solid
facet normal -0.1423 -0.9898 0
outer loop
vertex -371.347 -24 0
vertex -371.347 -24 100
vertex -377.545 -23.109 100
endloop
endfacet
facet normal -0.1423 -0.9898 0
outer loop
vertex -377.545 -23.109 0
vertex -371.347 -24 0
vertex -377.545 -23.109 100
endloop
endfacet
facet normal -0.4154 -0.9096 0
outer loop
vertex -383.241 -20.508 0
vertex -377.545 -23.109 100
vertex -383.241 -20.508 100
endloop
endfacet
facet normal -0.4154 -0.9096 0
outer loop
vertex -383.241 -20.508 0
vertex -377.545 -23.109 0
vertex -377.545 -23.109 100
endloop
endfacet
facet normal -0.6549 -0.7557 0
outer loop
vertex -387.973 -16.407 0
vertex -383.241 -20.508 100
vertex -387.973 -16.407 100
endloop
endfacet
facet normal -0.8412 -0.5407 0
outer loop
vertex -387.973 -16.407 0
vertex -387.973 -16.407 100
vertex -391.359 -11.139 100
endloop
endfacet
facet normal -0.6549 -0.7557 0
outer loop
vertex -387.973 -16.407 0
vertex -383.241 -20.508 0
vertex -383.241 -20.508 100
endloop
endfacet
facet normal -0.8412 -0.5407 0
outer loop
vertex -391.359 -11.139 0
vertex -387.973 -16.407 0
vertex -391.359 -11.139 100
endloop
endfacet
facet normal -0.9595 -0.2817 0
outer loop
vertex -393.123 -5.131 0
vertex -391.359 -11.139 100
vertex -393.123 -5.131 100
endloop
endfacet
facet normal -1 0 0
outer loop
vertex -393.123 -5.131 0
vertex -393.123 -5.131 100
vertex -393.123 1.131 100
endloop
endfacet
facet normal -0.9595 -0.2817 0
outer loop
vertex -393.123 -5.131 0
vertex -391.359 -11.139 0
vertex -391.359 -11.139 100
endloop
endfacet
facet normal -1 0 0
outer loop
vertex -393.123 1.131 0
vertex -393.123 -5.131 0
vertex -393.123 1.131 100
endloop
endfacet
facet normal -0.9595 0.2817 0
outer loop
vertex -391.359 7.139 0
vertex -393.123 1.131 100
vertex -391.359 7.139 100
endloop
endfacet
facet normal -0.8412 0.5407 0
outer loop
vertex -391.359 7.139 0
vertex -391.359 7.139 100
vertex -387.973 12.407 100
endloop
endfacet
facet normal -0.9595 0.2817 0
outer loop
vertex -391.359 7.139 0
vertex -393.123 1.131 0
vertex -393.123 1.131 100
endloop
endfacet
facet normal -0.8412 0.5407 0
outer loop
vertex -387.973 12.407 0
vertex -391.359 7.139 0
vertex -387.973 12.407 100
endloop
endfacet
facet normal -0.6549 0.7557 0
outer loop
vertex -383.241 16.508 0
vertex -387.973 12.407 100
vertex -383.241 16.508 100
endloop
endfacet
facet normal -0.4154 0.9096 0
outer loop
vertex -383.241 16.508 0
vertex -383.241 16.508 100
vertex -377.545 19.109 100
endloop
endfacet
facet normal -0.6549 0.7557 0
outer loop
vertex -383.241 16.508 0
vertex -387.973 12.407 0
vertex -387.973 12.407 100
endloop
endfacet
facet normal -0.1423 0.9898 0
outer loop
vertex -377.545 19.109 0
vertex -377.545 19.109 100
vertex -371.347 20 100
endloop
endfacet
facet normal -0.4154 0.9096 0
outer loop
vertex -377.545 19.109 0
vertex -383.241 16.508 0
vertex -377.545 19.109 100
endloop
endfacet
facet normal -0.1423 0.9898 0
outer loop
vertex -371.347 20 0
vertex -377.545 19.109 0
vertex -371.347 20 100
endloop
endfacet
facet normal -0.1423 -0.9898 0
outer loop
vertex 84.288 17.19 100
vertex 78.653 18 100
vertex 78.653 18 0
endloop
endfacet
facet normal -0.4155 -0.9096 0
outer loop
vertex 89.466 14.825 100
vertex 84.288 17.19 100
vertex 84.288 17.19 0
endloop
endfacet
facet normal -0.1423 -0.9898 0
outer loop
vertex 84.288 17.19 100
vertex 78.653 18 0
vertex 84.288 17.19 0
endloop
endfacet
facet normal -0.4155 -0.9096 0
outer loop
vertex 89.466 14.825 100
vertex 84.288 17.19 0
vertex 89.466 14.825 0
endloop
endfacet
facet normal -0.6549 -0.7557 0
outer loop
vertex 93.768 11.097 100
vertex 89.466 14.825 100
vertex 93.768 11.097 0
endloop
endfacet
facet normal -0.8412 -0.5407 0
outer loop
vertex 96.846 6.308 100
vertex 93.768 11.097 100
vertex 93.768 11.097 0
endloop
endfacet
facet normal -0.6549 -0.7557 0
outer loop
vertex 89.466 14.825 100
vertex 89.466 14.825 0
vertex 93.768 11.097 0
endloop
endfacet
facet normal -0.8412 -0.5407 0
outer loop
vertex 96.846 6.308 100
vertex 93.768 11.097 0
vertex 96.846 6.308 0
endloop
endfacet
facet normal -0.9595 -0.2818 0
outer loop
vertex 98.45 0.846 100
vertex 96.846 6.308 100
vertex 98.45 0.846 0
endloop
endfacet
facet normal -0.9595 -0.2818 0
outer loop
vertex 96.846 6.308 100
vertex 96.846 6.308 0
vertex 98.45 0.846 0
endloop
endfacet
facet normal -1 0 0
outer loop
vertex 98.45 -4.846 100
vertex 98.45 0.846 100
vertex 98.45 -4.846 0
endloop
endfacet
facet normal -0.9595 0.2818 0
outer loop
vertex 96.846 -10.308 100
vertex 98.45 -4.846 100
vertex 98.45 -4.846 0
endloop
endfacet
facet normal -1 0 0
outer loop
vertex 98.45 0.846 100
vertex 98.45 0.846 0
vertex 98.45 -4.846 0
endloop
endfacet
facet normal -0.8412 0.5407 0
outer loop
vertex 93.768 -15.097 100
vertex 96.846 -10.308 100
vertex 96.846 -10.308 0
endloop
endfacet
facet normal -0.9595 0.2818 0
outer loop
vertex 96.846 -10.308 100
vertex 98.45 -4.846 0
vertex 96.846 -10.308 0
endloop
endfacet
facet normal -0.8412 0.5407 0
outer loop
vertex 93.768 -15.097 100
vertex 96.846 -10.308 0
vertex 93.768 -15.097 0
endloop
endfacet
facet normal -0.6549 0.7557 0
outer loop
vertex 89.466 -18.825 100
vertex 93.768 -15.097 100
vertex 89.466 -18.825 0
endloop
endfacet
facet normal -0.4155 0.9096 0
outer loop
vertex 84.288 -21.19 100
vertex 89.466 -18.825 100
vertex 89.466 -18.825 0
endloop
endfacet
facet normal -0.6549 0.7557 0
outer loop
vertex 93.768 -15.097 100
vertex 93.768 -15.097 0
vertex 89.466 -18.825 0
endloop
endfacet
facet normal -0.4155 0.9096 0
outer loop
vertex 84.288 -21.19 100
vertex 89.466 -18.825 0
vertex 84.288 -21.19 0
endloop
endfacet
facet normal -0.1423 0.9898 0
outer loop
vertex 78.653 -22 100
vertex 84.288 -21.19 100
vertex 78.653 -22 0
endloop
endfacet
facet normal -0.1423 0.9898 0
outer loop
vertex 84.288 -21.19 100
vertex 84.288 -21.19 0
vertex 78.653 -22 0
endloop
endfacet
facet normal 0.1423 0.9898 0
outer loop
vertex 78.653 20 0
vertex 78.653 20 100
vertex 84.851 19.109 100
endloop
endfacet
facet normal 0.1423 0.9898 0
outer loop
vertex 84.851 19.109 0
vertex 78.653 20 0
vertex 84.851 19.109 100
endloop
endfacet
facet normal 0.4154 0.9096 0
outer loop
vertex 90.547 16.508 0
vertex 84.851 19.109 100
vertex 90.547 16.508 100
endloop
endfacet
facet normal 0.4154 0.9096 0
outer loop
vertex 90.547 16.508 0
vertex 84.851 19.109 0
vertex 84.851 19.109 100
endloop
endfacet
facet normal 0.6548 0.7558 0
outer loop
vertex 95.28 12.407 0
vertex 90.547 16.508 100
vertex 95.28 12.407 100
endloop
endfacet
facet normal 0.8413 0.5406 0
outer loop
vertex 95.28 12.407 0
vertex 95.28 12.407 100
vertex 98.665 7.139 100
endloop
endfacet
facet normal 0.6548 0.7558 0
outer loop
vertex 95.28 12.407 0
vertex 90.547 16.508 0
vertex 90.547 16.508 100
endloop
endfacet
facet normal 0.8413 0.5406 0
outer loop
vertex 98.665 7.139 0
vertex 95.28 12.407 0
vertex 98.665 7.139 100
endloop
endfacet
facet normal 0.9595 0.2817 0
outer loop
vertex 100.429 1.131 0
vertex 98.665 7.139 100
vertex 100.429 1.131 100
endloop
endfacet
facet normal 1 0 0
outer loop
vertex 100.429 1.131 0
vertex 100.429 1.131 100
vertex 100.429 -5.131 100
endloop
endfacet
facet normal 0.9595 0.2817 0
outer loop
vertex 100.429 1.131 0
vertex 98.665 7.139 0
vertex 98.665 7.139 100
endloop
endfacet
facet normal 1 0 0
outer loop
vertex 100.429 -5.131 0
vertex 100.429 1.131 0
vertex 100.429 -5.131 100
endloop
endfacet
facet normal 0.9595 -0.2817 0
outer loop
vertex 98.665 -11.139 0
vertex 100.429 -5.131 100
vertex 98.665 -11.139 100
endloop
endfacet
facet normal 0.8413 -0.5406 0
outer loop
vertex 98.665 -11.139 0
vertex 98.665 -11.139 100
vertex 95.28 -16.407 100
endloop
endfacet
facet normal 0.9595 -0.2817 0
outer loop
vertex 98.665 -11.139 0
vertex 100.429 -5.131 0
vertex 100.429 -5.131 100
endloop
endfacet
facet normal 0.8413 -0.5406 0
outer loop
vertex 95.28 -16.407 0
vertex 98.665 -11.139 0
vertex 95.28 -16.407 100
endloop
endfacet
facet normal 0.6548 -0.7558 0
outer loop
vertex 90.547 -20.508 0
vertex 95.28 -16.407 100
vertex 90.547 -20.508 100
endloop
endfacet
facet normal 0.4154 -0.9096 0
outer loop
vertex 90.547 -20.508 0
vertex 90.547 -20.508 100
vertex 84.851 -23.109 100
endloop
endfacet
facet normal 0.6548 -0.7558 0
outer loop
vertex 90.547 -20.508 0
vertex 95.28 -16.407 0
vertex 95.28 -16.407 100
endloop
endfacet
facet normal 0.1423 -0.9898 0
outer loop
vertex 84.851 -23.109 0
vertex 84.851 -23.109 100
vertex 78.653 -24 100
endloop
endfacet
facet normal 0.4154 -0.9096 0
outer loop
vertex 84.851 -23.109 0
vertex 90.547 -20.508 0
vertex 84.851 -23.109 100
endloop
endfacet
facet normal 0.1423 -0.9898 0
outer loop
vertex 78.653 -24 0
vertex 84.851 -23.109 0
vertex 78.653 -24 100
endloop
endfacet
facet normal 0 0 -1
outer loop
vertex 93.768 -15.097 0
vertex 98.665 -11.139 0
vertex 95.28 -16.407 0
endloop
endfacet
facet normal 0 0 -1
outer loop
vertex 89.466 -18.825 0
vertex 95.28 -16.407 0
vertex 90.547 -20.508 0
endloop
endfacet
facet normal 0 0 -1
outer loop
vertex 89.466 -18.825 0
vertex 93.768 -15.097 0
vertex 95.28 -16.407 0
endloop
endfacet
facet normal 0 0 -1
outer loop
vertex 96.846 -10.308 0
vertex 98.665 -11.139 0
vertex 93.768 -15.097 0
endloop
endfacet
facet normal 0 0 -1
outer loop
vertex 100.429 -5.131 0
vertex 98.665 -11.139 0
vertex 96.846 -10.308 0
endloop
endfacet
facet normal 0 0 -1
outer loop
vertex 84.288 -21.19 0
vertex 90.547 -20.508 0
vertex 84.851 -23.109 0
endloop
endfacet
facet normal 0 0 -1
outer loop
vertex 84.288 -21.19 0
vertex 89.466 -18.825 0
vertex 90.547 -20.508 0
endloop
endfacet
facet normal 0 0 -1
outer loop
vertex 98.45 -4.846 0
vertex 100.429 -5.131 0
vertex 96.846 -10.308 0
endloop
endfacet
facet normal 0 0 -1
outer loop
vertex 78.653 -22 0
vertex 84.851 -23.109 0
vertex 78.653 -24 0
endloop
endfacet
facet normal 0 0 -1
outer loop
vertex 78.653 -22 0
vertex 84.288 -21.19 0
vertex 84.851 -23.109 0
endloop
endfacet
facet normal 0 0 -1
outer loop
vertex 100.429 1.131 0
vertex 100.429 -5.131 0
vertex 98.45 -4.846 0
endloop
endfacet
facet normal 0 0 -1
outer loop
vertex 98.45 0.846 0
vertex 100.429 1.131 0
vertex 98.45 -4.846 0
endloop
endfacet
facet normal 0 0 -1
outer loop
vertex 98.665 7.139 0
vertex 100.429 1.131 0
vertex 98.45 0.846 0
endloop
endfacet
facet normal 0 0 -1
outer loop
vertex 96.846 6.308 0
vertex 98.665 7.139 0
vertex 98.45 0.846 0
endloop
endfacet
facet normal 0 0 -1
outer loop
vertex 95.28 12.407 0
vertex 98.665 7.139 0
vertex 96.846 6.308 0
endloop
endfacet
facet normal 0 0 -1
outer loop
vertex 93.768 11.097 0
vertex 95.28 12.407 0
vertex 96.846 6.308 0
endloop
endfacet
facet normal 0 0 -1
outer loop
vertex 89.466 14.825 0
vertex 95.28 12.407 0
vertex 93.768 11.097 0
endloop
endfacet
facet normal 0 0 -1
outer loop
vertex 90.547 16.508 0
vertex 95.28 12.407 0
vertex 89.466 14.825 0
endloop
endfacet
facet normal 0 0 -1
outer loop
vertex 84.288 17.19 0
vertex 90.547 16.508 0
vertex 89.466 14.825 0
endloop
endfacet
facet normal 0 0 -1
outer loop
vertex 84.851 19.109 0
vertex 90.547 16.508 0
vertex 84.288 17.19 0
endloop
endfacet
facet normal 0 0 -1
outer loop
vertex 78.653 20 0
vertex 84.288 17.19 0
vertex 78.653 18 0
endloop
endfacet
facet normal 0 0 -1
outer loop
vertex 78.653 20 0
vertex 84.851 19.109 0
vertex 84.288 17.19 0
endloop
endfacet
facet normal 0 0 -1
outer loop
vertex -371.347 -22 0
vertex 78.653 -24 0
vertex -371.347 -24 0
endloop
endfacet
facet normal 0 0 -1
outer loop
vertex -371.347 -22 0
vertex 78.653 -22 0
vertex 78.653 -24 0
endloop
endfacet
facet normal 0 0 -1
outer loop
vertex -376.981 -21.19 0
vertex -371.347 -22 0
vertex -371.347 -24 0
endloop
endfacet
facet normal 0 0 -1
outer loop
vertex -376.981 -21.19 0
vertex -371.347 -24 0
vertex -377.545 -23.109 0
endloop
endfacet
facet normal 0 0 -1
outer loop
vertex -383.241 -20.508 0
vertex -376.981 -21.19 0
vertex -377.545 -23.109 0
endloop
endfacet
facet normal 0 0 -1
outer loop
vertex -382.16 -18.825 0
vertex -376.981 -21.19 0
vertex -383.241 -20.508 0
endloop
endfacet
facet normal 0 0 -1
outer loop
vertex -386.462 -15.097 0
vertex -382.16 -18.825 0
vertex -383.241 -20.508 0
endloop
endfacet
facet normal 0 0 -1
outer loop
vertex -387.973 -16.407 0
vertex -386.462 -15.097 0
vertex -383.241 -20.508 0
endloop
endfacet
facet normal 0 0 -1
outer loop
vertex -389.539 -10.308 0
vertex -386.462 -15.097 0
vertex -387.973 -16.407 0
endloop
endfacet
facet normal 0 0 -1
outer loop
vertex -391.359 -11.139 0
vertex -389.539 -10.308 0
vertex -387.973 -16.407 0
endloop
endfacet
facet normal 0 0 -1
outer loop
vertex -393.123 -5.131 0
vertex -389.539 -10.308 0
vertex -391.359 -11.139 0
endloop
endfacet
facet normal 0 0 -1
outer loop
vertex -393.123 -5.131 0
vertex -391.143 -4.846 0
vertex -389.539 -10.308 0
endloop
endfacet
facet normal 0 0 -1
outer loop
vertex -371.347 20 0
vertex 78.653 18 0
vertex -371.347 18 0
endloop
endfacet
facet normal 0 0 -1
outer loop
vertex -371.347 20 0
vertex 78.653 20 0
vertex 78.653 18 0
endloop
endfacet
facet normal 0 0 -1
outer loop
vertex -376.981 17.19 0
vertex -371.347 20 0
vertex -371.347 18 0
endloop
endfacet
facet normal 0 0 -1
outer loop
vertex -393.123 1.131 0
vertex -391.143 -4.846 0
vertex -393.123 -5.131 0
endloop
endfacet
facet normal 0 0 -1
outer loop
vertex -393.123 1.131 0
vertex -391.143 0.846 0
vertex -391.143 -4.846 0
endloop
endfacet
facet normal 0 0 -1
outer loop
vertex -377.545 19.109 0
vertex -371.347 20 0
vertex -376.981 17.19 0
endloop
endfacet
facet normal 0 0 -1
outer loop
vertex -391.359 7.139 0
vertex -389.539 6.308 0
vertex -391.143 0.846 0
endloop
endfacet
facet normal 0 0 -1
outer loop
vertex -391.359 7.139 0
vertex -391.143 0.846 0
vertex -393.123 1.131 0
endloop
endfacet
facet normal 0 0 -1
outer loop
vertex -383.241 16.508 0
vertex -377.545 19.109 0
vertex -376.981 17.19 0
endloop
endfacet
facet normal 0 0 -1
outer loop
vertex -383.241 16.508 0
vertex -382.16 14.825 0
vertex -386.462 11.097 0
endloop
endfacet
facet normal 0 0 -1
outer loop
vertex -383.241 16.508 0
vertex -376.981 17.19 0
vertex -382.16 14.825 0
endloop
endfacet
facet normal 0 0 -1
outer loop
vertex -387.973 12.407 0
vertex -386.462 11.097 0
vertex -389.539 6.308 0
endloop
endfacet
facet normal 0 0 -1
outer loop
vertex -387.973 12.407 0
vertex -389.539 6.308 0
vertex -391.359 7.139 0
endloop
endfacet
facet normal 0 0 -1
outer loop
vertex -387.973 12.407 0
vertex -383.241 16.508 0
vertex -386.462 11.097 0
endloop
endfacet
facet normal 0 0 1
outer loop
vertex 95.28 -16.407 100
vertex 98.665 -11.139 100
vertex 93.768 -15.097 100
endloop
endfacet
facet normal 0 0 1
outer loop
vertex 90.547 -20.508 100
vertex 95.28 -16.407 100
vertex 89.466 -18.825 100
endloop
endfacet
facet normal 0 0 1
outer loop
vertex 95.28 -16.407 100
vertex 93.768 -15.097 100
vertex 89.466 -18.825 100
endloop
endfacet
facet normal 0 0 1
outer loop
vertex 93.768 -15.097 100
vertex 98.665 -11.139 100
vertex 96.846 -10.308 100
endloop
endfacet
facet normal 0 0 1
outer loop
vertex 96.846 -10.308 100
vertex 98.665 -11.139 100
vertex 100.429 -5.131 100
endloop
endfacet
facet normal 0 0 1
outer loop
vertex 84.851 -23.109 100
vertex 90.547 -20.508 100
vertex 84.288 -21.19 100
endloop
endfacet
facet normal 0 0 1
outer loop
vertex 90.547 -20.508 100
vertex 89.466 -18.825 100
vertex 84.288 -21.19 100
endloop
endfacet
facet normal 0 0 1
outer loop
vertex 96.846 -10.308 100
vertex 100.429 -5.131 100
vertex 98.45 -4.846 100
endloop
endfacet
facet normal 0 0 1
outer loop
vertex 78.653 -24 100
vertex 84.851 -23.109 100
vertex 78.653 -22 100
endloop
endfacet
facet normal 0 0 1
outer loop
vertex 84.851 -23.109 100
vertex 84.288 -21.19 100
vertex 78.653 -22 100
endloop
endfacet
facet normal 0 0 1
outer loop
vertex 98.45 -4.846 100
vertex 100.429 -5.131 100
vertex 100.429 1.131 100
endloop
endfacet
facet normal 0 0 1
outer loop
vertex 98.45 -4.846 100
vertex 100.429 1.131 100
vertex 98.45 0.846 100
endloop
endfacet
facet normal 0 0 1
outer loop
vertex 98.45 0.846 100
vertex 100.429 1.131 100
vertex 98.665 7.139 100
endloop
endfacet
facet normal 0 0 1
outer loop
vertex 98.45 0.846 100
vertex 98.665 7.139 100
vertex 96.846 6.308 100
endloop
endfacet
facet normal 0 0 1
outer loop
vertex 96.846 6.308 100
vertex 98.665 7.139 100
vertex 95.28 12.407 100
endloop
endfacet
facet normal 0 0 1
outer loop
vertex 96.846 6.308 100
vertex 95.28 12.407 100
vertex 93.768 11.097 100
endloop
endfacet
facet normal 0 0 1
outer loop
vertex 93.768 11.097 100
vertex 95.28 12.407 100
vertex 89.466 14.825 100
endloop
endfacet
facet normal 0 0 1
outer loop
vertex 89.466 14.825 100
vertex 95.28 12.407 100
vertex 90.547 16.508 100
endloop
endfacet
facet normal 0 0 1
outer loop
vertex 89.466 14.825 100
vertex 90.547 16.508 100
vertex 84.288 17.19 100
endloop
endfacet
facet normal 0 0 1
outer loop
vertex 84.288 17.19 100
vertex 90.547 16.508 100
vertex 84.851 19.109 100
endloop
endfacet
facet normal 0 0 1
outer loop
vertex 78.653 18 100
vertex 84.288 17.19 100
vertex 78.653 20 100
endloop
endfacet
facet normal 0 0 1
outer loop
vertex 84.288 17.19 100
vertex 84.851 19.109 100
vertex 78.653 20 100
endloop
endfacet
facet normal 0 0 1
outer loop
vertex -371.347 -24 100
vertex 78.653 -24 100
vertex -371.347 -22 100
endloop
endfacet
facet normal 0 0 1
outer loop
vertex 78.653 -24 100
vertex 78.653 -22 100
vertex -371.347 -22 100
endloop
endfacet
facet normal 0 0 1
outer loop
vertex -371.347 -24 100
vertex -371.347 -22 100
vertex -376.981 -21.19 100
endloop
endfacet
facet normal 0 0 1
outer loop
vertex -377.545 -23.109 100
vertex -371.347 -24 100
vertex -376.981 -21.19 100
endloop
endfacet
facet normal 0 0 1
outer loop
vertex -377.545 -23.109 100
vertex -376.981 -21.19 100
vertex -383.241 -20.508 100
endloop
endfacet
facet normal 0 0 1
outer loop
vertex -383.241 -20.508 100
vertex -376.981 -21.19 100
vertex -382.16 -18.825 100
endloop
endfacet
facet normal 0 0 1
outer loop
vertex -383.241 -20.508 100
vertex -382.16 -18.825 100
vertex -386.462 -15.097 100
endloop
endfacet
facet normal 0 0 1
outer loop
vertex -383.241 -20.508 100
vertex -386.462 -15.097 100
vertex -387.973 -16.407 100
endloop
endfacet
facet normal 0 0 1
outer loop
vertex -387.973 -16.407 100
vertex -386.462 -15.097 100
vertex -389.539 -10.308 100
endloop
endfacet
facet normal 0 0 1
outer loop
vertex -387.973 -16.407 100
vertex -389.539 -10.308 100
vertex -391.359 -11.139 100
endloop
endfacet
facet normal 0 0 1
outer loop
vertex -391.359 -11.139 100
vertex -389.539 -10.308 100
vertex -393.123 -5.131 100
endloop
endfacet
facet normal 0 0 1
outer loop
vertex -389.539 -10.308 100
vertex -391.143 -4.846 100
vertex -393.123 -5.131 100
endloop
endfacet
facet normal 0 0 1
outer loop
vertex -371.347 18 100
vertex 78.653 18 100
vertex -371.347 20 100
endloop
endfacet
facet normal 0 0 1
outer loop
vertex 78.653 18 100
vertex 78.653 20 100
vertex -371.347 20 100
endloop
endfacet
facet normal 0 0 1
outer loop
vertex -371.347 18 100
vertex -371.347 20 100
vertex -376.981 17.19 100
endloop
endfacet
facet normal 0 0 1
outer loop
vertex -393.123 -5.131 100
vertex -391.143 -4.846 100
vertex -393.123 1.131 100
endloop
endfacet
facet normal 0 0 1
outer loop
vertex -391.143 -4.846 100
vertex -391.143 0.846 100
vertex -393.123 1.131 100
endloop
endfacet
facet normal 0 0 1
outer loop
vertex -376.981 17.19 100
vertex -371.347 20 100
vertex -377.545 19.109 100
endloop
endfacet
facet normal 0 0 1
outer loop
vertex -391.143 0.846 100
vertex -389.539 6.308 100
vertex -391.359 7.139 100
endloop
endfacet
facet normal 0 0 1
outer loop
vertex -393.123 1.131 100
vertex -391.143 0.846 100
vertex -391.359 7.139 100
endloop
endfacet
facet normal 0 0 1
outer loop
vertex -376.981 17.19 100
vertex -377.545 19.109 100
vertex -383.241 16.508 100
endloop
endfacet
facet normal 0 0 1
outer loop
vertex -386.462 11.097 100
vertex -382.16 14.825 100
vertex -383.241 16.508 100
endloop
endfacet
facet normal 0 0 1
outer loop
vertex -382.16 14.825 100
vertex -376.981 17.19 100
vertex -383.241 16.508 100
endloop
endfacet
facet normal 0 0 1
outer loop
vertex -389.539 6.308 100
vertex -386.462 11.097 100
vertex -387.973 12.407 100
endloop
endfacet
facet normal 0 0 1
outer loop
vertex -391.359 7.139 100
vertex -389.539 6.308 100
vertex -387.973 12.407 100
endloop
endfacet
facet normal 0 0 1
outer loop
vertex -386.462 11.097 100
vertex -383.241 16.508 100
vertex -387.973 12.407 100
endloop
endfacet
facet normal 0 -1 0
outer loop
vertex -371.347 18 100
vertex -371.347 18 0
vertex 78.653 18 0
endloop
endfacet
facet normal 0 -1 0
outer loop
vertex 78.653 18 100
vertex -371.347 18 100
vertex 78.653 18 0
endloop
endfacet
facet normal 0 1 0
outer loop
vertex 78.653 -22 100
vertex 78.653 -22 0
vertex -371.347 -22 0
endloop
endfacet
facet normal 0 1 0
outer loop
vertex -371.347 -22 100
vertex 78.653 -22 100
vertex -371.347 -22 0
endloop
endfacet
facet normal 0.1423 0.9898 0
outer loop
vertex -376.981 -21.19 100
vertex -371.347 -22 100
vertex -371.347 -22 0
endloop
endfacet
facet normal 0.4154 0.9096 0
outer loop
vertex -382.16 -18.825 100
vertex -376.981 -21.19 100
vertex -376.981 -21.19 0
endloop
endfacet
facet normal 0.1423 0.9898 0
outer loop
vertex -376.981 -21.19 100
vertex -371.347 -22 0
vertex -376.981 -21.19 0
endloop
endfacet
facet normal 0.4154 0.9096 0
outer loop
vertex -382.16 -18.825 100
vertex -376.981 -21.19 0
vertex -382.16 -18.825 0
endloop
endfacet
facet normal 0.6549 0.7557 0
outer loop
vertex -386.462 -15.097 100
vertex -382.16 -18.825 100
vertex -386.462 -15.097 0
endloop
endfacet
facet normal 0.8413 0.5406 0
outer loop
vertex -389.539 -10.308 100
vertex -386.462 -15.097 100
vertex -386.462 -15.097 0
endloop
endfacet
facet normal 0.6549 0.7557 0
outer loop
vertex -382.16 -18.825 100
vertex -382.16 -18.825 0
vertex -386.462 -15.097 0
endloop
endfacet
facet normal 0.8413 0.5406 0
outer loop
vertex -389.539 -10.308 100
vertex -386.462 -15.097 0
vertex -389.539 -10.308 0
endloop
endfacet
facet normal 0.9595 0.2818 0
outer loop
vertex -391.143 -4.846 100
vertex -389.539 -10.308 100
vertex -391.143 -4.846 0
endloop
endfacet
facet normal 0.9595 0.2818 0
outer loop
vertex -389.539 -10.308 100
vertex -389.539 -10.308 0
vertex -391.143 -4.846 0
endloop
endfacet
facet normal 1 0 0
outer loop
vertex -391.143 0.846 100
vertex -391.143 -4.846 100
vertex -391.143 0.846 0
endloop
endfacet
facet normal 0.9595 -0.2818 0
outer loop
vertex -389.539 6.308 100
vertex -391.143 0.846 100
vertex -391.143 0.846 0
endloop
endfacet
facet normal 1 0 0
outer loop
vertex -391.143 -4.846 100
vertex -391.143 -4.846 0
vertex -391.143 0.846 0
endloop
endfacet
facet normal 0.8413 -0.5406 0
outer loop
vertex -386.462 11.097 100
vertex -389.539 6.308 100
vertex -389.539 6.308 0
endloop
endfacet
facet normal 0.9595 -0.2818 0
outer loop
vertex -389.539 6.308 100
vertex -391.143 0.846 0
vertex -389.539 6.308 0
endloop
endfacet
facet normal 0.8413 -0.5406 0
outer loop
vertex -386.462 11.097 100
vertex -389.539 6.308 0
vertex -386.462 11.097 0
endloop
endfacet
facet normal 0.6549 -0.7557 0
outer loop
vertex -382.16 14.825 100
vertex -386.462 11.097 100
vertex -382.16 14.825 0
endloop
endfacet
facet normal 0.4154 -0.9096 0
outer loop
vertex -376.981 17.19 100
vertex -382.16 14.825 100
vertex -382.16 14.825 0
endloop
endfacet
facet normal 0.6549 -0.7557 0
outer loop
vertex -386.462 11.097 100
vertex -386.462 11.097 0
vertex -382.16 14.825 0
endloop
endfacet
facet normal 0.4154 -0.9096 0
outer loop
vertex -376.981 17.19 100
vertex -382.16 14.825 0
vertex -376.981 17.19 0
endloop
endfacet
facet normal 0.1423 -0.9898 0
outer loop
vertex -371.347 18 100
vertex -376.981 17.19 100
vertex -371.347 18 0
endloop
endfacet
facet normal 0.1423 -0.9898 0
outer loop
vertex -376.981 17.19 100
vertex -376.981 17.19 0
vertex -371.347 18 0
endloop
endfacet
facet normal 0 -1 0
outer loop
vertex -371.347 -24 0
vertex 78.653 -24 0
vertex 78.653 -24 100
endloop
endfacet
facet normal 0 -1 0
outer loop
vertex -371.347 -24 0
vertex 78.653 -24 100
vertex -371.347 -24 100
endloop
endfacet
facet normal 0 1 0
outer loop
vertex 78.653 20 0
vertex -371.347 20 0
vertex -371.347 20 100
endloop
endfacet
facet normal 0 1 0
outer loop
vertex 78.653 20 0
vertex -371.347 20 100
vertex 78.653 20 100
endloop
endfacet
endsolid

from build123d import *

# Parameters (mm, degrees)
BOSS_EXTRUDE1_DEPTH = 100
SHELL2_T            = -2


with BuildPart() as part:
    # Sketch1 → Boss-Extrude1 (new body)
    with BuildSketch(Plane.XY):
        with BuildLine():
            Line((-371.346770179, 20), (78.653229821, 20))
            ThreePointArc((78.653229821, 20), (100.653229821, -2), (78.653229821, -24))
            Line((78.653229821, -24), (-371.346770179, -24))
            ThreePointArc((-371.346770179, -24), (-393.346770179, -2), (-371.346770179, 20))
        make_face()
    extrude(amount=BOSS_EXTRUDE1_DEPTH)

    # Shell2
    shell2_openings = [part.faces().sort_by_distance(p)[0] for p in [
        (-146.346770179, -2, 100),
        (-146.346770179, -2, 0),
    ]]
    offset(amount=SHELL2_T, openings=shell2_openings, kind=Kind.INTERSECTION)


solid = part.part
